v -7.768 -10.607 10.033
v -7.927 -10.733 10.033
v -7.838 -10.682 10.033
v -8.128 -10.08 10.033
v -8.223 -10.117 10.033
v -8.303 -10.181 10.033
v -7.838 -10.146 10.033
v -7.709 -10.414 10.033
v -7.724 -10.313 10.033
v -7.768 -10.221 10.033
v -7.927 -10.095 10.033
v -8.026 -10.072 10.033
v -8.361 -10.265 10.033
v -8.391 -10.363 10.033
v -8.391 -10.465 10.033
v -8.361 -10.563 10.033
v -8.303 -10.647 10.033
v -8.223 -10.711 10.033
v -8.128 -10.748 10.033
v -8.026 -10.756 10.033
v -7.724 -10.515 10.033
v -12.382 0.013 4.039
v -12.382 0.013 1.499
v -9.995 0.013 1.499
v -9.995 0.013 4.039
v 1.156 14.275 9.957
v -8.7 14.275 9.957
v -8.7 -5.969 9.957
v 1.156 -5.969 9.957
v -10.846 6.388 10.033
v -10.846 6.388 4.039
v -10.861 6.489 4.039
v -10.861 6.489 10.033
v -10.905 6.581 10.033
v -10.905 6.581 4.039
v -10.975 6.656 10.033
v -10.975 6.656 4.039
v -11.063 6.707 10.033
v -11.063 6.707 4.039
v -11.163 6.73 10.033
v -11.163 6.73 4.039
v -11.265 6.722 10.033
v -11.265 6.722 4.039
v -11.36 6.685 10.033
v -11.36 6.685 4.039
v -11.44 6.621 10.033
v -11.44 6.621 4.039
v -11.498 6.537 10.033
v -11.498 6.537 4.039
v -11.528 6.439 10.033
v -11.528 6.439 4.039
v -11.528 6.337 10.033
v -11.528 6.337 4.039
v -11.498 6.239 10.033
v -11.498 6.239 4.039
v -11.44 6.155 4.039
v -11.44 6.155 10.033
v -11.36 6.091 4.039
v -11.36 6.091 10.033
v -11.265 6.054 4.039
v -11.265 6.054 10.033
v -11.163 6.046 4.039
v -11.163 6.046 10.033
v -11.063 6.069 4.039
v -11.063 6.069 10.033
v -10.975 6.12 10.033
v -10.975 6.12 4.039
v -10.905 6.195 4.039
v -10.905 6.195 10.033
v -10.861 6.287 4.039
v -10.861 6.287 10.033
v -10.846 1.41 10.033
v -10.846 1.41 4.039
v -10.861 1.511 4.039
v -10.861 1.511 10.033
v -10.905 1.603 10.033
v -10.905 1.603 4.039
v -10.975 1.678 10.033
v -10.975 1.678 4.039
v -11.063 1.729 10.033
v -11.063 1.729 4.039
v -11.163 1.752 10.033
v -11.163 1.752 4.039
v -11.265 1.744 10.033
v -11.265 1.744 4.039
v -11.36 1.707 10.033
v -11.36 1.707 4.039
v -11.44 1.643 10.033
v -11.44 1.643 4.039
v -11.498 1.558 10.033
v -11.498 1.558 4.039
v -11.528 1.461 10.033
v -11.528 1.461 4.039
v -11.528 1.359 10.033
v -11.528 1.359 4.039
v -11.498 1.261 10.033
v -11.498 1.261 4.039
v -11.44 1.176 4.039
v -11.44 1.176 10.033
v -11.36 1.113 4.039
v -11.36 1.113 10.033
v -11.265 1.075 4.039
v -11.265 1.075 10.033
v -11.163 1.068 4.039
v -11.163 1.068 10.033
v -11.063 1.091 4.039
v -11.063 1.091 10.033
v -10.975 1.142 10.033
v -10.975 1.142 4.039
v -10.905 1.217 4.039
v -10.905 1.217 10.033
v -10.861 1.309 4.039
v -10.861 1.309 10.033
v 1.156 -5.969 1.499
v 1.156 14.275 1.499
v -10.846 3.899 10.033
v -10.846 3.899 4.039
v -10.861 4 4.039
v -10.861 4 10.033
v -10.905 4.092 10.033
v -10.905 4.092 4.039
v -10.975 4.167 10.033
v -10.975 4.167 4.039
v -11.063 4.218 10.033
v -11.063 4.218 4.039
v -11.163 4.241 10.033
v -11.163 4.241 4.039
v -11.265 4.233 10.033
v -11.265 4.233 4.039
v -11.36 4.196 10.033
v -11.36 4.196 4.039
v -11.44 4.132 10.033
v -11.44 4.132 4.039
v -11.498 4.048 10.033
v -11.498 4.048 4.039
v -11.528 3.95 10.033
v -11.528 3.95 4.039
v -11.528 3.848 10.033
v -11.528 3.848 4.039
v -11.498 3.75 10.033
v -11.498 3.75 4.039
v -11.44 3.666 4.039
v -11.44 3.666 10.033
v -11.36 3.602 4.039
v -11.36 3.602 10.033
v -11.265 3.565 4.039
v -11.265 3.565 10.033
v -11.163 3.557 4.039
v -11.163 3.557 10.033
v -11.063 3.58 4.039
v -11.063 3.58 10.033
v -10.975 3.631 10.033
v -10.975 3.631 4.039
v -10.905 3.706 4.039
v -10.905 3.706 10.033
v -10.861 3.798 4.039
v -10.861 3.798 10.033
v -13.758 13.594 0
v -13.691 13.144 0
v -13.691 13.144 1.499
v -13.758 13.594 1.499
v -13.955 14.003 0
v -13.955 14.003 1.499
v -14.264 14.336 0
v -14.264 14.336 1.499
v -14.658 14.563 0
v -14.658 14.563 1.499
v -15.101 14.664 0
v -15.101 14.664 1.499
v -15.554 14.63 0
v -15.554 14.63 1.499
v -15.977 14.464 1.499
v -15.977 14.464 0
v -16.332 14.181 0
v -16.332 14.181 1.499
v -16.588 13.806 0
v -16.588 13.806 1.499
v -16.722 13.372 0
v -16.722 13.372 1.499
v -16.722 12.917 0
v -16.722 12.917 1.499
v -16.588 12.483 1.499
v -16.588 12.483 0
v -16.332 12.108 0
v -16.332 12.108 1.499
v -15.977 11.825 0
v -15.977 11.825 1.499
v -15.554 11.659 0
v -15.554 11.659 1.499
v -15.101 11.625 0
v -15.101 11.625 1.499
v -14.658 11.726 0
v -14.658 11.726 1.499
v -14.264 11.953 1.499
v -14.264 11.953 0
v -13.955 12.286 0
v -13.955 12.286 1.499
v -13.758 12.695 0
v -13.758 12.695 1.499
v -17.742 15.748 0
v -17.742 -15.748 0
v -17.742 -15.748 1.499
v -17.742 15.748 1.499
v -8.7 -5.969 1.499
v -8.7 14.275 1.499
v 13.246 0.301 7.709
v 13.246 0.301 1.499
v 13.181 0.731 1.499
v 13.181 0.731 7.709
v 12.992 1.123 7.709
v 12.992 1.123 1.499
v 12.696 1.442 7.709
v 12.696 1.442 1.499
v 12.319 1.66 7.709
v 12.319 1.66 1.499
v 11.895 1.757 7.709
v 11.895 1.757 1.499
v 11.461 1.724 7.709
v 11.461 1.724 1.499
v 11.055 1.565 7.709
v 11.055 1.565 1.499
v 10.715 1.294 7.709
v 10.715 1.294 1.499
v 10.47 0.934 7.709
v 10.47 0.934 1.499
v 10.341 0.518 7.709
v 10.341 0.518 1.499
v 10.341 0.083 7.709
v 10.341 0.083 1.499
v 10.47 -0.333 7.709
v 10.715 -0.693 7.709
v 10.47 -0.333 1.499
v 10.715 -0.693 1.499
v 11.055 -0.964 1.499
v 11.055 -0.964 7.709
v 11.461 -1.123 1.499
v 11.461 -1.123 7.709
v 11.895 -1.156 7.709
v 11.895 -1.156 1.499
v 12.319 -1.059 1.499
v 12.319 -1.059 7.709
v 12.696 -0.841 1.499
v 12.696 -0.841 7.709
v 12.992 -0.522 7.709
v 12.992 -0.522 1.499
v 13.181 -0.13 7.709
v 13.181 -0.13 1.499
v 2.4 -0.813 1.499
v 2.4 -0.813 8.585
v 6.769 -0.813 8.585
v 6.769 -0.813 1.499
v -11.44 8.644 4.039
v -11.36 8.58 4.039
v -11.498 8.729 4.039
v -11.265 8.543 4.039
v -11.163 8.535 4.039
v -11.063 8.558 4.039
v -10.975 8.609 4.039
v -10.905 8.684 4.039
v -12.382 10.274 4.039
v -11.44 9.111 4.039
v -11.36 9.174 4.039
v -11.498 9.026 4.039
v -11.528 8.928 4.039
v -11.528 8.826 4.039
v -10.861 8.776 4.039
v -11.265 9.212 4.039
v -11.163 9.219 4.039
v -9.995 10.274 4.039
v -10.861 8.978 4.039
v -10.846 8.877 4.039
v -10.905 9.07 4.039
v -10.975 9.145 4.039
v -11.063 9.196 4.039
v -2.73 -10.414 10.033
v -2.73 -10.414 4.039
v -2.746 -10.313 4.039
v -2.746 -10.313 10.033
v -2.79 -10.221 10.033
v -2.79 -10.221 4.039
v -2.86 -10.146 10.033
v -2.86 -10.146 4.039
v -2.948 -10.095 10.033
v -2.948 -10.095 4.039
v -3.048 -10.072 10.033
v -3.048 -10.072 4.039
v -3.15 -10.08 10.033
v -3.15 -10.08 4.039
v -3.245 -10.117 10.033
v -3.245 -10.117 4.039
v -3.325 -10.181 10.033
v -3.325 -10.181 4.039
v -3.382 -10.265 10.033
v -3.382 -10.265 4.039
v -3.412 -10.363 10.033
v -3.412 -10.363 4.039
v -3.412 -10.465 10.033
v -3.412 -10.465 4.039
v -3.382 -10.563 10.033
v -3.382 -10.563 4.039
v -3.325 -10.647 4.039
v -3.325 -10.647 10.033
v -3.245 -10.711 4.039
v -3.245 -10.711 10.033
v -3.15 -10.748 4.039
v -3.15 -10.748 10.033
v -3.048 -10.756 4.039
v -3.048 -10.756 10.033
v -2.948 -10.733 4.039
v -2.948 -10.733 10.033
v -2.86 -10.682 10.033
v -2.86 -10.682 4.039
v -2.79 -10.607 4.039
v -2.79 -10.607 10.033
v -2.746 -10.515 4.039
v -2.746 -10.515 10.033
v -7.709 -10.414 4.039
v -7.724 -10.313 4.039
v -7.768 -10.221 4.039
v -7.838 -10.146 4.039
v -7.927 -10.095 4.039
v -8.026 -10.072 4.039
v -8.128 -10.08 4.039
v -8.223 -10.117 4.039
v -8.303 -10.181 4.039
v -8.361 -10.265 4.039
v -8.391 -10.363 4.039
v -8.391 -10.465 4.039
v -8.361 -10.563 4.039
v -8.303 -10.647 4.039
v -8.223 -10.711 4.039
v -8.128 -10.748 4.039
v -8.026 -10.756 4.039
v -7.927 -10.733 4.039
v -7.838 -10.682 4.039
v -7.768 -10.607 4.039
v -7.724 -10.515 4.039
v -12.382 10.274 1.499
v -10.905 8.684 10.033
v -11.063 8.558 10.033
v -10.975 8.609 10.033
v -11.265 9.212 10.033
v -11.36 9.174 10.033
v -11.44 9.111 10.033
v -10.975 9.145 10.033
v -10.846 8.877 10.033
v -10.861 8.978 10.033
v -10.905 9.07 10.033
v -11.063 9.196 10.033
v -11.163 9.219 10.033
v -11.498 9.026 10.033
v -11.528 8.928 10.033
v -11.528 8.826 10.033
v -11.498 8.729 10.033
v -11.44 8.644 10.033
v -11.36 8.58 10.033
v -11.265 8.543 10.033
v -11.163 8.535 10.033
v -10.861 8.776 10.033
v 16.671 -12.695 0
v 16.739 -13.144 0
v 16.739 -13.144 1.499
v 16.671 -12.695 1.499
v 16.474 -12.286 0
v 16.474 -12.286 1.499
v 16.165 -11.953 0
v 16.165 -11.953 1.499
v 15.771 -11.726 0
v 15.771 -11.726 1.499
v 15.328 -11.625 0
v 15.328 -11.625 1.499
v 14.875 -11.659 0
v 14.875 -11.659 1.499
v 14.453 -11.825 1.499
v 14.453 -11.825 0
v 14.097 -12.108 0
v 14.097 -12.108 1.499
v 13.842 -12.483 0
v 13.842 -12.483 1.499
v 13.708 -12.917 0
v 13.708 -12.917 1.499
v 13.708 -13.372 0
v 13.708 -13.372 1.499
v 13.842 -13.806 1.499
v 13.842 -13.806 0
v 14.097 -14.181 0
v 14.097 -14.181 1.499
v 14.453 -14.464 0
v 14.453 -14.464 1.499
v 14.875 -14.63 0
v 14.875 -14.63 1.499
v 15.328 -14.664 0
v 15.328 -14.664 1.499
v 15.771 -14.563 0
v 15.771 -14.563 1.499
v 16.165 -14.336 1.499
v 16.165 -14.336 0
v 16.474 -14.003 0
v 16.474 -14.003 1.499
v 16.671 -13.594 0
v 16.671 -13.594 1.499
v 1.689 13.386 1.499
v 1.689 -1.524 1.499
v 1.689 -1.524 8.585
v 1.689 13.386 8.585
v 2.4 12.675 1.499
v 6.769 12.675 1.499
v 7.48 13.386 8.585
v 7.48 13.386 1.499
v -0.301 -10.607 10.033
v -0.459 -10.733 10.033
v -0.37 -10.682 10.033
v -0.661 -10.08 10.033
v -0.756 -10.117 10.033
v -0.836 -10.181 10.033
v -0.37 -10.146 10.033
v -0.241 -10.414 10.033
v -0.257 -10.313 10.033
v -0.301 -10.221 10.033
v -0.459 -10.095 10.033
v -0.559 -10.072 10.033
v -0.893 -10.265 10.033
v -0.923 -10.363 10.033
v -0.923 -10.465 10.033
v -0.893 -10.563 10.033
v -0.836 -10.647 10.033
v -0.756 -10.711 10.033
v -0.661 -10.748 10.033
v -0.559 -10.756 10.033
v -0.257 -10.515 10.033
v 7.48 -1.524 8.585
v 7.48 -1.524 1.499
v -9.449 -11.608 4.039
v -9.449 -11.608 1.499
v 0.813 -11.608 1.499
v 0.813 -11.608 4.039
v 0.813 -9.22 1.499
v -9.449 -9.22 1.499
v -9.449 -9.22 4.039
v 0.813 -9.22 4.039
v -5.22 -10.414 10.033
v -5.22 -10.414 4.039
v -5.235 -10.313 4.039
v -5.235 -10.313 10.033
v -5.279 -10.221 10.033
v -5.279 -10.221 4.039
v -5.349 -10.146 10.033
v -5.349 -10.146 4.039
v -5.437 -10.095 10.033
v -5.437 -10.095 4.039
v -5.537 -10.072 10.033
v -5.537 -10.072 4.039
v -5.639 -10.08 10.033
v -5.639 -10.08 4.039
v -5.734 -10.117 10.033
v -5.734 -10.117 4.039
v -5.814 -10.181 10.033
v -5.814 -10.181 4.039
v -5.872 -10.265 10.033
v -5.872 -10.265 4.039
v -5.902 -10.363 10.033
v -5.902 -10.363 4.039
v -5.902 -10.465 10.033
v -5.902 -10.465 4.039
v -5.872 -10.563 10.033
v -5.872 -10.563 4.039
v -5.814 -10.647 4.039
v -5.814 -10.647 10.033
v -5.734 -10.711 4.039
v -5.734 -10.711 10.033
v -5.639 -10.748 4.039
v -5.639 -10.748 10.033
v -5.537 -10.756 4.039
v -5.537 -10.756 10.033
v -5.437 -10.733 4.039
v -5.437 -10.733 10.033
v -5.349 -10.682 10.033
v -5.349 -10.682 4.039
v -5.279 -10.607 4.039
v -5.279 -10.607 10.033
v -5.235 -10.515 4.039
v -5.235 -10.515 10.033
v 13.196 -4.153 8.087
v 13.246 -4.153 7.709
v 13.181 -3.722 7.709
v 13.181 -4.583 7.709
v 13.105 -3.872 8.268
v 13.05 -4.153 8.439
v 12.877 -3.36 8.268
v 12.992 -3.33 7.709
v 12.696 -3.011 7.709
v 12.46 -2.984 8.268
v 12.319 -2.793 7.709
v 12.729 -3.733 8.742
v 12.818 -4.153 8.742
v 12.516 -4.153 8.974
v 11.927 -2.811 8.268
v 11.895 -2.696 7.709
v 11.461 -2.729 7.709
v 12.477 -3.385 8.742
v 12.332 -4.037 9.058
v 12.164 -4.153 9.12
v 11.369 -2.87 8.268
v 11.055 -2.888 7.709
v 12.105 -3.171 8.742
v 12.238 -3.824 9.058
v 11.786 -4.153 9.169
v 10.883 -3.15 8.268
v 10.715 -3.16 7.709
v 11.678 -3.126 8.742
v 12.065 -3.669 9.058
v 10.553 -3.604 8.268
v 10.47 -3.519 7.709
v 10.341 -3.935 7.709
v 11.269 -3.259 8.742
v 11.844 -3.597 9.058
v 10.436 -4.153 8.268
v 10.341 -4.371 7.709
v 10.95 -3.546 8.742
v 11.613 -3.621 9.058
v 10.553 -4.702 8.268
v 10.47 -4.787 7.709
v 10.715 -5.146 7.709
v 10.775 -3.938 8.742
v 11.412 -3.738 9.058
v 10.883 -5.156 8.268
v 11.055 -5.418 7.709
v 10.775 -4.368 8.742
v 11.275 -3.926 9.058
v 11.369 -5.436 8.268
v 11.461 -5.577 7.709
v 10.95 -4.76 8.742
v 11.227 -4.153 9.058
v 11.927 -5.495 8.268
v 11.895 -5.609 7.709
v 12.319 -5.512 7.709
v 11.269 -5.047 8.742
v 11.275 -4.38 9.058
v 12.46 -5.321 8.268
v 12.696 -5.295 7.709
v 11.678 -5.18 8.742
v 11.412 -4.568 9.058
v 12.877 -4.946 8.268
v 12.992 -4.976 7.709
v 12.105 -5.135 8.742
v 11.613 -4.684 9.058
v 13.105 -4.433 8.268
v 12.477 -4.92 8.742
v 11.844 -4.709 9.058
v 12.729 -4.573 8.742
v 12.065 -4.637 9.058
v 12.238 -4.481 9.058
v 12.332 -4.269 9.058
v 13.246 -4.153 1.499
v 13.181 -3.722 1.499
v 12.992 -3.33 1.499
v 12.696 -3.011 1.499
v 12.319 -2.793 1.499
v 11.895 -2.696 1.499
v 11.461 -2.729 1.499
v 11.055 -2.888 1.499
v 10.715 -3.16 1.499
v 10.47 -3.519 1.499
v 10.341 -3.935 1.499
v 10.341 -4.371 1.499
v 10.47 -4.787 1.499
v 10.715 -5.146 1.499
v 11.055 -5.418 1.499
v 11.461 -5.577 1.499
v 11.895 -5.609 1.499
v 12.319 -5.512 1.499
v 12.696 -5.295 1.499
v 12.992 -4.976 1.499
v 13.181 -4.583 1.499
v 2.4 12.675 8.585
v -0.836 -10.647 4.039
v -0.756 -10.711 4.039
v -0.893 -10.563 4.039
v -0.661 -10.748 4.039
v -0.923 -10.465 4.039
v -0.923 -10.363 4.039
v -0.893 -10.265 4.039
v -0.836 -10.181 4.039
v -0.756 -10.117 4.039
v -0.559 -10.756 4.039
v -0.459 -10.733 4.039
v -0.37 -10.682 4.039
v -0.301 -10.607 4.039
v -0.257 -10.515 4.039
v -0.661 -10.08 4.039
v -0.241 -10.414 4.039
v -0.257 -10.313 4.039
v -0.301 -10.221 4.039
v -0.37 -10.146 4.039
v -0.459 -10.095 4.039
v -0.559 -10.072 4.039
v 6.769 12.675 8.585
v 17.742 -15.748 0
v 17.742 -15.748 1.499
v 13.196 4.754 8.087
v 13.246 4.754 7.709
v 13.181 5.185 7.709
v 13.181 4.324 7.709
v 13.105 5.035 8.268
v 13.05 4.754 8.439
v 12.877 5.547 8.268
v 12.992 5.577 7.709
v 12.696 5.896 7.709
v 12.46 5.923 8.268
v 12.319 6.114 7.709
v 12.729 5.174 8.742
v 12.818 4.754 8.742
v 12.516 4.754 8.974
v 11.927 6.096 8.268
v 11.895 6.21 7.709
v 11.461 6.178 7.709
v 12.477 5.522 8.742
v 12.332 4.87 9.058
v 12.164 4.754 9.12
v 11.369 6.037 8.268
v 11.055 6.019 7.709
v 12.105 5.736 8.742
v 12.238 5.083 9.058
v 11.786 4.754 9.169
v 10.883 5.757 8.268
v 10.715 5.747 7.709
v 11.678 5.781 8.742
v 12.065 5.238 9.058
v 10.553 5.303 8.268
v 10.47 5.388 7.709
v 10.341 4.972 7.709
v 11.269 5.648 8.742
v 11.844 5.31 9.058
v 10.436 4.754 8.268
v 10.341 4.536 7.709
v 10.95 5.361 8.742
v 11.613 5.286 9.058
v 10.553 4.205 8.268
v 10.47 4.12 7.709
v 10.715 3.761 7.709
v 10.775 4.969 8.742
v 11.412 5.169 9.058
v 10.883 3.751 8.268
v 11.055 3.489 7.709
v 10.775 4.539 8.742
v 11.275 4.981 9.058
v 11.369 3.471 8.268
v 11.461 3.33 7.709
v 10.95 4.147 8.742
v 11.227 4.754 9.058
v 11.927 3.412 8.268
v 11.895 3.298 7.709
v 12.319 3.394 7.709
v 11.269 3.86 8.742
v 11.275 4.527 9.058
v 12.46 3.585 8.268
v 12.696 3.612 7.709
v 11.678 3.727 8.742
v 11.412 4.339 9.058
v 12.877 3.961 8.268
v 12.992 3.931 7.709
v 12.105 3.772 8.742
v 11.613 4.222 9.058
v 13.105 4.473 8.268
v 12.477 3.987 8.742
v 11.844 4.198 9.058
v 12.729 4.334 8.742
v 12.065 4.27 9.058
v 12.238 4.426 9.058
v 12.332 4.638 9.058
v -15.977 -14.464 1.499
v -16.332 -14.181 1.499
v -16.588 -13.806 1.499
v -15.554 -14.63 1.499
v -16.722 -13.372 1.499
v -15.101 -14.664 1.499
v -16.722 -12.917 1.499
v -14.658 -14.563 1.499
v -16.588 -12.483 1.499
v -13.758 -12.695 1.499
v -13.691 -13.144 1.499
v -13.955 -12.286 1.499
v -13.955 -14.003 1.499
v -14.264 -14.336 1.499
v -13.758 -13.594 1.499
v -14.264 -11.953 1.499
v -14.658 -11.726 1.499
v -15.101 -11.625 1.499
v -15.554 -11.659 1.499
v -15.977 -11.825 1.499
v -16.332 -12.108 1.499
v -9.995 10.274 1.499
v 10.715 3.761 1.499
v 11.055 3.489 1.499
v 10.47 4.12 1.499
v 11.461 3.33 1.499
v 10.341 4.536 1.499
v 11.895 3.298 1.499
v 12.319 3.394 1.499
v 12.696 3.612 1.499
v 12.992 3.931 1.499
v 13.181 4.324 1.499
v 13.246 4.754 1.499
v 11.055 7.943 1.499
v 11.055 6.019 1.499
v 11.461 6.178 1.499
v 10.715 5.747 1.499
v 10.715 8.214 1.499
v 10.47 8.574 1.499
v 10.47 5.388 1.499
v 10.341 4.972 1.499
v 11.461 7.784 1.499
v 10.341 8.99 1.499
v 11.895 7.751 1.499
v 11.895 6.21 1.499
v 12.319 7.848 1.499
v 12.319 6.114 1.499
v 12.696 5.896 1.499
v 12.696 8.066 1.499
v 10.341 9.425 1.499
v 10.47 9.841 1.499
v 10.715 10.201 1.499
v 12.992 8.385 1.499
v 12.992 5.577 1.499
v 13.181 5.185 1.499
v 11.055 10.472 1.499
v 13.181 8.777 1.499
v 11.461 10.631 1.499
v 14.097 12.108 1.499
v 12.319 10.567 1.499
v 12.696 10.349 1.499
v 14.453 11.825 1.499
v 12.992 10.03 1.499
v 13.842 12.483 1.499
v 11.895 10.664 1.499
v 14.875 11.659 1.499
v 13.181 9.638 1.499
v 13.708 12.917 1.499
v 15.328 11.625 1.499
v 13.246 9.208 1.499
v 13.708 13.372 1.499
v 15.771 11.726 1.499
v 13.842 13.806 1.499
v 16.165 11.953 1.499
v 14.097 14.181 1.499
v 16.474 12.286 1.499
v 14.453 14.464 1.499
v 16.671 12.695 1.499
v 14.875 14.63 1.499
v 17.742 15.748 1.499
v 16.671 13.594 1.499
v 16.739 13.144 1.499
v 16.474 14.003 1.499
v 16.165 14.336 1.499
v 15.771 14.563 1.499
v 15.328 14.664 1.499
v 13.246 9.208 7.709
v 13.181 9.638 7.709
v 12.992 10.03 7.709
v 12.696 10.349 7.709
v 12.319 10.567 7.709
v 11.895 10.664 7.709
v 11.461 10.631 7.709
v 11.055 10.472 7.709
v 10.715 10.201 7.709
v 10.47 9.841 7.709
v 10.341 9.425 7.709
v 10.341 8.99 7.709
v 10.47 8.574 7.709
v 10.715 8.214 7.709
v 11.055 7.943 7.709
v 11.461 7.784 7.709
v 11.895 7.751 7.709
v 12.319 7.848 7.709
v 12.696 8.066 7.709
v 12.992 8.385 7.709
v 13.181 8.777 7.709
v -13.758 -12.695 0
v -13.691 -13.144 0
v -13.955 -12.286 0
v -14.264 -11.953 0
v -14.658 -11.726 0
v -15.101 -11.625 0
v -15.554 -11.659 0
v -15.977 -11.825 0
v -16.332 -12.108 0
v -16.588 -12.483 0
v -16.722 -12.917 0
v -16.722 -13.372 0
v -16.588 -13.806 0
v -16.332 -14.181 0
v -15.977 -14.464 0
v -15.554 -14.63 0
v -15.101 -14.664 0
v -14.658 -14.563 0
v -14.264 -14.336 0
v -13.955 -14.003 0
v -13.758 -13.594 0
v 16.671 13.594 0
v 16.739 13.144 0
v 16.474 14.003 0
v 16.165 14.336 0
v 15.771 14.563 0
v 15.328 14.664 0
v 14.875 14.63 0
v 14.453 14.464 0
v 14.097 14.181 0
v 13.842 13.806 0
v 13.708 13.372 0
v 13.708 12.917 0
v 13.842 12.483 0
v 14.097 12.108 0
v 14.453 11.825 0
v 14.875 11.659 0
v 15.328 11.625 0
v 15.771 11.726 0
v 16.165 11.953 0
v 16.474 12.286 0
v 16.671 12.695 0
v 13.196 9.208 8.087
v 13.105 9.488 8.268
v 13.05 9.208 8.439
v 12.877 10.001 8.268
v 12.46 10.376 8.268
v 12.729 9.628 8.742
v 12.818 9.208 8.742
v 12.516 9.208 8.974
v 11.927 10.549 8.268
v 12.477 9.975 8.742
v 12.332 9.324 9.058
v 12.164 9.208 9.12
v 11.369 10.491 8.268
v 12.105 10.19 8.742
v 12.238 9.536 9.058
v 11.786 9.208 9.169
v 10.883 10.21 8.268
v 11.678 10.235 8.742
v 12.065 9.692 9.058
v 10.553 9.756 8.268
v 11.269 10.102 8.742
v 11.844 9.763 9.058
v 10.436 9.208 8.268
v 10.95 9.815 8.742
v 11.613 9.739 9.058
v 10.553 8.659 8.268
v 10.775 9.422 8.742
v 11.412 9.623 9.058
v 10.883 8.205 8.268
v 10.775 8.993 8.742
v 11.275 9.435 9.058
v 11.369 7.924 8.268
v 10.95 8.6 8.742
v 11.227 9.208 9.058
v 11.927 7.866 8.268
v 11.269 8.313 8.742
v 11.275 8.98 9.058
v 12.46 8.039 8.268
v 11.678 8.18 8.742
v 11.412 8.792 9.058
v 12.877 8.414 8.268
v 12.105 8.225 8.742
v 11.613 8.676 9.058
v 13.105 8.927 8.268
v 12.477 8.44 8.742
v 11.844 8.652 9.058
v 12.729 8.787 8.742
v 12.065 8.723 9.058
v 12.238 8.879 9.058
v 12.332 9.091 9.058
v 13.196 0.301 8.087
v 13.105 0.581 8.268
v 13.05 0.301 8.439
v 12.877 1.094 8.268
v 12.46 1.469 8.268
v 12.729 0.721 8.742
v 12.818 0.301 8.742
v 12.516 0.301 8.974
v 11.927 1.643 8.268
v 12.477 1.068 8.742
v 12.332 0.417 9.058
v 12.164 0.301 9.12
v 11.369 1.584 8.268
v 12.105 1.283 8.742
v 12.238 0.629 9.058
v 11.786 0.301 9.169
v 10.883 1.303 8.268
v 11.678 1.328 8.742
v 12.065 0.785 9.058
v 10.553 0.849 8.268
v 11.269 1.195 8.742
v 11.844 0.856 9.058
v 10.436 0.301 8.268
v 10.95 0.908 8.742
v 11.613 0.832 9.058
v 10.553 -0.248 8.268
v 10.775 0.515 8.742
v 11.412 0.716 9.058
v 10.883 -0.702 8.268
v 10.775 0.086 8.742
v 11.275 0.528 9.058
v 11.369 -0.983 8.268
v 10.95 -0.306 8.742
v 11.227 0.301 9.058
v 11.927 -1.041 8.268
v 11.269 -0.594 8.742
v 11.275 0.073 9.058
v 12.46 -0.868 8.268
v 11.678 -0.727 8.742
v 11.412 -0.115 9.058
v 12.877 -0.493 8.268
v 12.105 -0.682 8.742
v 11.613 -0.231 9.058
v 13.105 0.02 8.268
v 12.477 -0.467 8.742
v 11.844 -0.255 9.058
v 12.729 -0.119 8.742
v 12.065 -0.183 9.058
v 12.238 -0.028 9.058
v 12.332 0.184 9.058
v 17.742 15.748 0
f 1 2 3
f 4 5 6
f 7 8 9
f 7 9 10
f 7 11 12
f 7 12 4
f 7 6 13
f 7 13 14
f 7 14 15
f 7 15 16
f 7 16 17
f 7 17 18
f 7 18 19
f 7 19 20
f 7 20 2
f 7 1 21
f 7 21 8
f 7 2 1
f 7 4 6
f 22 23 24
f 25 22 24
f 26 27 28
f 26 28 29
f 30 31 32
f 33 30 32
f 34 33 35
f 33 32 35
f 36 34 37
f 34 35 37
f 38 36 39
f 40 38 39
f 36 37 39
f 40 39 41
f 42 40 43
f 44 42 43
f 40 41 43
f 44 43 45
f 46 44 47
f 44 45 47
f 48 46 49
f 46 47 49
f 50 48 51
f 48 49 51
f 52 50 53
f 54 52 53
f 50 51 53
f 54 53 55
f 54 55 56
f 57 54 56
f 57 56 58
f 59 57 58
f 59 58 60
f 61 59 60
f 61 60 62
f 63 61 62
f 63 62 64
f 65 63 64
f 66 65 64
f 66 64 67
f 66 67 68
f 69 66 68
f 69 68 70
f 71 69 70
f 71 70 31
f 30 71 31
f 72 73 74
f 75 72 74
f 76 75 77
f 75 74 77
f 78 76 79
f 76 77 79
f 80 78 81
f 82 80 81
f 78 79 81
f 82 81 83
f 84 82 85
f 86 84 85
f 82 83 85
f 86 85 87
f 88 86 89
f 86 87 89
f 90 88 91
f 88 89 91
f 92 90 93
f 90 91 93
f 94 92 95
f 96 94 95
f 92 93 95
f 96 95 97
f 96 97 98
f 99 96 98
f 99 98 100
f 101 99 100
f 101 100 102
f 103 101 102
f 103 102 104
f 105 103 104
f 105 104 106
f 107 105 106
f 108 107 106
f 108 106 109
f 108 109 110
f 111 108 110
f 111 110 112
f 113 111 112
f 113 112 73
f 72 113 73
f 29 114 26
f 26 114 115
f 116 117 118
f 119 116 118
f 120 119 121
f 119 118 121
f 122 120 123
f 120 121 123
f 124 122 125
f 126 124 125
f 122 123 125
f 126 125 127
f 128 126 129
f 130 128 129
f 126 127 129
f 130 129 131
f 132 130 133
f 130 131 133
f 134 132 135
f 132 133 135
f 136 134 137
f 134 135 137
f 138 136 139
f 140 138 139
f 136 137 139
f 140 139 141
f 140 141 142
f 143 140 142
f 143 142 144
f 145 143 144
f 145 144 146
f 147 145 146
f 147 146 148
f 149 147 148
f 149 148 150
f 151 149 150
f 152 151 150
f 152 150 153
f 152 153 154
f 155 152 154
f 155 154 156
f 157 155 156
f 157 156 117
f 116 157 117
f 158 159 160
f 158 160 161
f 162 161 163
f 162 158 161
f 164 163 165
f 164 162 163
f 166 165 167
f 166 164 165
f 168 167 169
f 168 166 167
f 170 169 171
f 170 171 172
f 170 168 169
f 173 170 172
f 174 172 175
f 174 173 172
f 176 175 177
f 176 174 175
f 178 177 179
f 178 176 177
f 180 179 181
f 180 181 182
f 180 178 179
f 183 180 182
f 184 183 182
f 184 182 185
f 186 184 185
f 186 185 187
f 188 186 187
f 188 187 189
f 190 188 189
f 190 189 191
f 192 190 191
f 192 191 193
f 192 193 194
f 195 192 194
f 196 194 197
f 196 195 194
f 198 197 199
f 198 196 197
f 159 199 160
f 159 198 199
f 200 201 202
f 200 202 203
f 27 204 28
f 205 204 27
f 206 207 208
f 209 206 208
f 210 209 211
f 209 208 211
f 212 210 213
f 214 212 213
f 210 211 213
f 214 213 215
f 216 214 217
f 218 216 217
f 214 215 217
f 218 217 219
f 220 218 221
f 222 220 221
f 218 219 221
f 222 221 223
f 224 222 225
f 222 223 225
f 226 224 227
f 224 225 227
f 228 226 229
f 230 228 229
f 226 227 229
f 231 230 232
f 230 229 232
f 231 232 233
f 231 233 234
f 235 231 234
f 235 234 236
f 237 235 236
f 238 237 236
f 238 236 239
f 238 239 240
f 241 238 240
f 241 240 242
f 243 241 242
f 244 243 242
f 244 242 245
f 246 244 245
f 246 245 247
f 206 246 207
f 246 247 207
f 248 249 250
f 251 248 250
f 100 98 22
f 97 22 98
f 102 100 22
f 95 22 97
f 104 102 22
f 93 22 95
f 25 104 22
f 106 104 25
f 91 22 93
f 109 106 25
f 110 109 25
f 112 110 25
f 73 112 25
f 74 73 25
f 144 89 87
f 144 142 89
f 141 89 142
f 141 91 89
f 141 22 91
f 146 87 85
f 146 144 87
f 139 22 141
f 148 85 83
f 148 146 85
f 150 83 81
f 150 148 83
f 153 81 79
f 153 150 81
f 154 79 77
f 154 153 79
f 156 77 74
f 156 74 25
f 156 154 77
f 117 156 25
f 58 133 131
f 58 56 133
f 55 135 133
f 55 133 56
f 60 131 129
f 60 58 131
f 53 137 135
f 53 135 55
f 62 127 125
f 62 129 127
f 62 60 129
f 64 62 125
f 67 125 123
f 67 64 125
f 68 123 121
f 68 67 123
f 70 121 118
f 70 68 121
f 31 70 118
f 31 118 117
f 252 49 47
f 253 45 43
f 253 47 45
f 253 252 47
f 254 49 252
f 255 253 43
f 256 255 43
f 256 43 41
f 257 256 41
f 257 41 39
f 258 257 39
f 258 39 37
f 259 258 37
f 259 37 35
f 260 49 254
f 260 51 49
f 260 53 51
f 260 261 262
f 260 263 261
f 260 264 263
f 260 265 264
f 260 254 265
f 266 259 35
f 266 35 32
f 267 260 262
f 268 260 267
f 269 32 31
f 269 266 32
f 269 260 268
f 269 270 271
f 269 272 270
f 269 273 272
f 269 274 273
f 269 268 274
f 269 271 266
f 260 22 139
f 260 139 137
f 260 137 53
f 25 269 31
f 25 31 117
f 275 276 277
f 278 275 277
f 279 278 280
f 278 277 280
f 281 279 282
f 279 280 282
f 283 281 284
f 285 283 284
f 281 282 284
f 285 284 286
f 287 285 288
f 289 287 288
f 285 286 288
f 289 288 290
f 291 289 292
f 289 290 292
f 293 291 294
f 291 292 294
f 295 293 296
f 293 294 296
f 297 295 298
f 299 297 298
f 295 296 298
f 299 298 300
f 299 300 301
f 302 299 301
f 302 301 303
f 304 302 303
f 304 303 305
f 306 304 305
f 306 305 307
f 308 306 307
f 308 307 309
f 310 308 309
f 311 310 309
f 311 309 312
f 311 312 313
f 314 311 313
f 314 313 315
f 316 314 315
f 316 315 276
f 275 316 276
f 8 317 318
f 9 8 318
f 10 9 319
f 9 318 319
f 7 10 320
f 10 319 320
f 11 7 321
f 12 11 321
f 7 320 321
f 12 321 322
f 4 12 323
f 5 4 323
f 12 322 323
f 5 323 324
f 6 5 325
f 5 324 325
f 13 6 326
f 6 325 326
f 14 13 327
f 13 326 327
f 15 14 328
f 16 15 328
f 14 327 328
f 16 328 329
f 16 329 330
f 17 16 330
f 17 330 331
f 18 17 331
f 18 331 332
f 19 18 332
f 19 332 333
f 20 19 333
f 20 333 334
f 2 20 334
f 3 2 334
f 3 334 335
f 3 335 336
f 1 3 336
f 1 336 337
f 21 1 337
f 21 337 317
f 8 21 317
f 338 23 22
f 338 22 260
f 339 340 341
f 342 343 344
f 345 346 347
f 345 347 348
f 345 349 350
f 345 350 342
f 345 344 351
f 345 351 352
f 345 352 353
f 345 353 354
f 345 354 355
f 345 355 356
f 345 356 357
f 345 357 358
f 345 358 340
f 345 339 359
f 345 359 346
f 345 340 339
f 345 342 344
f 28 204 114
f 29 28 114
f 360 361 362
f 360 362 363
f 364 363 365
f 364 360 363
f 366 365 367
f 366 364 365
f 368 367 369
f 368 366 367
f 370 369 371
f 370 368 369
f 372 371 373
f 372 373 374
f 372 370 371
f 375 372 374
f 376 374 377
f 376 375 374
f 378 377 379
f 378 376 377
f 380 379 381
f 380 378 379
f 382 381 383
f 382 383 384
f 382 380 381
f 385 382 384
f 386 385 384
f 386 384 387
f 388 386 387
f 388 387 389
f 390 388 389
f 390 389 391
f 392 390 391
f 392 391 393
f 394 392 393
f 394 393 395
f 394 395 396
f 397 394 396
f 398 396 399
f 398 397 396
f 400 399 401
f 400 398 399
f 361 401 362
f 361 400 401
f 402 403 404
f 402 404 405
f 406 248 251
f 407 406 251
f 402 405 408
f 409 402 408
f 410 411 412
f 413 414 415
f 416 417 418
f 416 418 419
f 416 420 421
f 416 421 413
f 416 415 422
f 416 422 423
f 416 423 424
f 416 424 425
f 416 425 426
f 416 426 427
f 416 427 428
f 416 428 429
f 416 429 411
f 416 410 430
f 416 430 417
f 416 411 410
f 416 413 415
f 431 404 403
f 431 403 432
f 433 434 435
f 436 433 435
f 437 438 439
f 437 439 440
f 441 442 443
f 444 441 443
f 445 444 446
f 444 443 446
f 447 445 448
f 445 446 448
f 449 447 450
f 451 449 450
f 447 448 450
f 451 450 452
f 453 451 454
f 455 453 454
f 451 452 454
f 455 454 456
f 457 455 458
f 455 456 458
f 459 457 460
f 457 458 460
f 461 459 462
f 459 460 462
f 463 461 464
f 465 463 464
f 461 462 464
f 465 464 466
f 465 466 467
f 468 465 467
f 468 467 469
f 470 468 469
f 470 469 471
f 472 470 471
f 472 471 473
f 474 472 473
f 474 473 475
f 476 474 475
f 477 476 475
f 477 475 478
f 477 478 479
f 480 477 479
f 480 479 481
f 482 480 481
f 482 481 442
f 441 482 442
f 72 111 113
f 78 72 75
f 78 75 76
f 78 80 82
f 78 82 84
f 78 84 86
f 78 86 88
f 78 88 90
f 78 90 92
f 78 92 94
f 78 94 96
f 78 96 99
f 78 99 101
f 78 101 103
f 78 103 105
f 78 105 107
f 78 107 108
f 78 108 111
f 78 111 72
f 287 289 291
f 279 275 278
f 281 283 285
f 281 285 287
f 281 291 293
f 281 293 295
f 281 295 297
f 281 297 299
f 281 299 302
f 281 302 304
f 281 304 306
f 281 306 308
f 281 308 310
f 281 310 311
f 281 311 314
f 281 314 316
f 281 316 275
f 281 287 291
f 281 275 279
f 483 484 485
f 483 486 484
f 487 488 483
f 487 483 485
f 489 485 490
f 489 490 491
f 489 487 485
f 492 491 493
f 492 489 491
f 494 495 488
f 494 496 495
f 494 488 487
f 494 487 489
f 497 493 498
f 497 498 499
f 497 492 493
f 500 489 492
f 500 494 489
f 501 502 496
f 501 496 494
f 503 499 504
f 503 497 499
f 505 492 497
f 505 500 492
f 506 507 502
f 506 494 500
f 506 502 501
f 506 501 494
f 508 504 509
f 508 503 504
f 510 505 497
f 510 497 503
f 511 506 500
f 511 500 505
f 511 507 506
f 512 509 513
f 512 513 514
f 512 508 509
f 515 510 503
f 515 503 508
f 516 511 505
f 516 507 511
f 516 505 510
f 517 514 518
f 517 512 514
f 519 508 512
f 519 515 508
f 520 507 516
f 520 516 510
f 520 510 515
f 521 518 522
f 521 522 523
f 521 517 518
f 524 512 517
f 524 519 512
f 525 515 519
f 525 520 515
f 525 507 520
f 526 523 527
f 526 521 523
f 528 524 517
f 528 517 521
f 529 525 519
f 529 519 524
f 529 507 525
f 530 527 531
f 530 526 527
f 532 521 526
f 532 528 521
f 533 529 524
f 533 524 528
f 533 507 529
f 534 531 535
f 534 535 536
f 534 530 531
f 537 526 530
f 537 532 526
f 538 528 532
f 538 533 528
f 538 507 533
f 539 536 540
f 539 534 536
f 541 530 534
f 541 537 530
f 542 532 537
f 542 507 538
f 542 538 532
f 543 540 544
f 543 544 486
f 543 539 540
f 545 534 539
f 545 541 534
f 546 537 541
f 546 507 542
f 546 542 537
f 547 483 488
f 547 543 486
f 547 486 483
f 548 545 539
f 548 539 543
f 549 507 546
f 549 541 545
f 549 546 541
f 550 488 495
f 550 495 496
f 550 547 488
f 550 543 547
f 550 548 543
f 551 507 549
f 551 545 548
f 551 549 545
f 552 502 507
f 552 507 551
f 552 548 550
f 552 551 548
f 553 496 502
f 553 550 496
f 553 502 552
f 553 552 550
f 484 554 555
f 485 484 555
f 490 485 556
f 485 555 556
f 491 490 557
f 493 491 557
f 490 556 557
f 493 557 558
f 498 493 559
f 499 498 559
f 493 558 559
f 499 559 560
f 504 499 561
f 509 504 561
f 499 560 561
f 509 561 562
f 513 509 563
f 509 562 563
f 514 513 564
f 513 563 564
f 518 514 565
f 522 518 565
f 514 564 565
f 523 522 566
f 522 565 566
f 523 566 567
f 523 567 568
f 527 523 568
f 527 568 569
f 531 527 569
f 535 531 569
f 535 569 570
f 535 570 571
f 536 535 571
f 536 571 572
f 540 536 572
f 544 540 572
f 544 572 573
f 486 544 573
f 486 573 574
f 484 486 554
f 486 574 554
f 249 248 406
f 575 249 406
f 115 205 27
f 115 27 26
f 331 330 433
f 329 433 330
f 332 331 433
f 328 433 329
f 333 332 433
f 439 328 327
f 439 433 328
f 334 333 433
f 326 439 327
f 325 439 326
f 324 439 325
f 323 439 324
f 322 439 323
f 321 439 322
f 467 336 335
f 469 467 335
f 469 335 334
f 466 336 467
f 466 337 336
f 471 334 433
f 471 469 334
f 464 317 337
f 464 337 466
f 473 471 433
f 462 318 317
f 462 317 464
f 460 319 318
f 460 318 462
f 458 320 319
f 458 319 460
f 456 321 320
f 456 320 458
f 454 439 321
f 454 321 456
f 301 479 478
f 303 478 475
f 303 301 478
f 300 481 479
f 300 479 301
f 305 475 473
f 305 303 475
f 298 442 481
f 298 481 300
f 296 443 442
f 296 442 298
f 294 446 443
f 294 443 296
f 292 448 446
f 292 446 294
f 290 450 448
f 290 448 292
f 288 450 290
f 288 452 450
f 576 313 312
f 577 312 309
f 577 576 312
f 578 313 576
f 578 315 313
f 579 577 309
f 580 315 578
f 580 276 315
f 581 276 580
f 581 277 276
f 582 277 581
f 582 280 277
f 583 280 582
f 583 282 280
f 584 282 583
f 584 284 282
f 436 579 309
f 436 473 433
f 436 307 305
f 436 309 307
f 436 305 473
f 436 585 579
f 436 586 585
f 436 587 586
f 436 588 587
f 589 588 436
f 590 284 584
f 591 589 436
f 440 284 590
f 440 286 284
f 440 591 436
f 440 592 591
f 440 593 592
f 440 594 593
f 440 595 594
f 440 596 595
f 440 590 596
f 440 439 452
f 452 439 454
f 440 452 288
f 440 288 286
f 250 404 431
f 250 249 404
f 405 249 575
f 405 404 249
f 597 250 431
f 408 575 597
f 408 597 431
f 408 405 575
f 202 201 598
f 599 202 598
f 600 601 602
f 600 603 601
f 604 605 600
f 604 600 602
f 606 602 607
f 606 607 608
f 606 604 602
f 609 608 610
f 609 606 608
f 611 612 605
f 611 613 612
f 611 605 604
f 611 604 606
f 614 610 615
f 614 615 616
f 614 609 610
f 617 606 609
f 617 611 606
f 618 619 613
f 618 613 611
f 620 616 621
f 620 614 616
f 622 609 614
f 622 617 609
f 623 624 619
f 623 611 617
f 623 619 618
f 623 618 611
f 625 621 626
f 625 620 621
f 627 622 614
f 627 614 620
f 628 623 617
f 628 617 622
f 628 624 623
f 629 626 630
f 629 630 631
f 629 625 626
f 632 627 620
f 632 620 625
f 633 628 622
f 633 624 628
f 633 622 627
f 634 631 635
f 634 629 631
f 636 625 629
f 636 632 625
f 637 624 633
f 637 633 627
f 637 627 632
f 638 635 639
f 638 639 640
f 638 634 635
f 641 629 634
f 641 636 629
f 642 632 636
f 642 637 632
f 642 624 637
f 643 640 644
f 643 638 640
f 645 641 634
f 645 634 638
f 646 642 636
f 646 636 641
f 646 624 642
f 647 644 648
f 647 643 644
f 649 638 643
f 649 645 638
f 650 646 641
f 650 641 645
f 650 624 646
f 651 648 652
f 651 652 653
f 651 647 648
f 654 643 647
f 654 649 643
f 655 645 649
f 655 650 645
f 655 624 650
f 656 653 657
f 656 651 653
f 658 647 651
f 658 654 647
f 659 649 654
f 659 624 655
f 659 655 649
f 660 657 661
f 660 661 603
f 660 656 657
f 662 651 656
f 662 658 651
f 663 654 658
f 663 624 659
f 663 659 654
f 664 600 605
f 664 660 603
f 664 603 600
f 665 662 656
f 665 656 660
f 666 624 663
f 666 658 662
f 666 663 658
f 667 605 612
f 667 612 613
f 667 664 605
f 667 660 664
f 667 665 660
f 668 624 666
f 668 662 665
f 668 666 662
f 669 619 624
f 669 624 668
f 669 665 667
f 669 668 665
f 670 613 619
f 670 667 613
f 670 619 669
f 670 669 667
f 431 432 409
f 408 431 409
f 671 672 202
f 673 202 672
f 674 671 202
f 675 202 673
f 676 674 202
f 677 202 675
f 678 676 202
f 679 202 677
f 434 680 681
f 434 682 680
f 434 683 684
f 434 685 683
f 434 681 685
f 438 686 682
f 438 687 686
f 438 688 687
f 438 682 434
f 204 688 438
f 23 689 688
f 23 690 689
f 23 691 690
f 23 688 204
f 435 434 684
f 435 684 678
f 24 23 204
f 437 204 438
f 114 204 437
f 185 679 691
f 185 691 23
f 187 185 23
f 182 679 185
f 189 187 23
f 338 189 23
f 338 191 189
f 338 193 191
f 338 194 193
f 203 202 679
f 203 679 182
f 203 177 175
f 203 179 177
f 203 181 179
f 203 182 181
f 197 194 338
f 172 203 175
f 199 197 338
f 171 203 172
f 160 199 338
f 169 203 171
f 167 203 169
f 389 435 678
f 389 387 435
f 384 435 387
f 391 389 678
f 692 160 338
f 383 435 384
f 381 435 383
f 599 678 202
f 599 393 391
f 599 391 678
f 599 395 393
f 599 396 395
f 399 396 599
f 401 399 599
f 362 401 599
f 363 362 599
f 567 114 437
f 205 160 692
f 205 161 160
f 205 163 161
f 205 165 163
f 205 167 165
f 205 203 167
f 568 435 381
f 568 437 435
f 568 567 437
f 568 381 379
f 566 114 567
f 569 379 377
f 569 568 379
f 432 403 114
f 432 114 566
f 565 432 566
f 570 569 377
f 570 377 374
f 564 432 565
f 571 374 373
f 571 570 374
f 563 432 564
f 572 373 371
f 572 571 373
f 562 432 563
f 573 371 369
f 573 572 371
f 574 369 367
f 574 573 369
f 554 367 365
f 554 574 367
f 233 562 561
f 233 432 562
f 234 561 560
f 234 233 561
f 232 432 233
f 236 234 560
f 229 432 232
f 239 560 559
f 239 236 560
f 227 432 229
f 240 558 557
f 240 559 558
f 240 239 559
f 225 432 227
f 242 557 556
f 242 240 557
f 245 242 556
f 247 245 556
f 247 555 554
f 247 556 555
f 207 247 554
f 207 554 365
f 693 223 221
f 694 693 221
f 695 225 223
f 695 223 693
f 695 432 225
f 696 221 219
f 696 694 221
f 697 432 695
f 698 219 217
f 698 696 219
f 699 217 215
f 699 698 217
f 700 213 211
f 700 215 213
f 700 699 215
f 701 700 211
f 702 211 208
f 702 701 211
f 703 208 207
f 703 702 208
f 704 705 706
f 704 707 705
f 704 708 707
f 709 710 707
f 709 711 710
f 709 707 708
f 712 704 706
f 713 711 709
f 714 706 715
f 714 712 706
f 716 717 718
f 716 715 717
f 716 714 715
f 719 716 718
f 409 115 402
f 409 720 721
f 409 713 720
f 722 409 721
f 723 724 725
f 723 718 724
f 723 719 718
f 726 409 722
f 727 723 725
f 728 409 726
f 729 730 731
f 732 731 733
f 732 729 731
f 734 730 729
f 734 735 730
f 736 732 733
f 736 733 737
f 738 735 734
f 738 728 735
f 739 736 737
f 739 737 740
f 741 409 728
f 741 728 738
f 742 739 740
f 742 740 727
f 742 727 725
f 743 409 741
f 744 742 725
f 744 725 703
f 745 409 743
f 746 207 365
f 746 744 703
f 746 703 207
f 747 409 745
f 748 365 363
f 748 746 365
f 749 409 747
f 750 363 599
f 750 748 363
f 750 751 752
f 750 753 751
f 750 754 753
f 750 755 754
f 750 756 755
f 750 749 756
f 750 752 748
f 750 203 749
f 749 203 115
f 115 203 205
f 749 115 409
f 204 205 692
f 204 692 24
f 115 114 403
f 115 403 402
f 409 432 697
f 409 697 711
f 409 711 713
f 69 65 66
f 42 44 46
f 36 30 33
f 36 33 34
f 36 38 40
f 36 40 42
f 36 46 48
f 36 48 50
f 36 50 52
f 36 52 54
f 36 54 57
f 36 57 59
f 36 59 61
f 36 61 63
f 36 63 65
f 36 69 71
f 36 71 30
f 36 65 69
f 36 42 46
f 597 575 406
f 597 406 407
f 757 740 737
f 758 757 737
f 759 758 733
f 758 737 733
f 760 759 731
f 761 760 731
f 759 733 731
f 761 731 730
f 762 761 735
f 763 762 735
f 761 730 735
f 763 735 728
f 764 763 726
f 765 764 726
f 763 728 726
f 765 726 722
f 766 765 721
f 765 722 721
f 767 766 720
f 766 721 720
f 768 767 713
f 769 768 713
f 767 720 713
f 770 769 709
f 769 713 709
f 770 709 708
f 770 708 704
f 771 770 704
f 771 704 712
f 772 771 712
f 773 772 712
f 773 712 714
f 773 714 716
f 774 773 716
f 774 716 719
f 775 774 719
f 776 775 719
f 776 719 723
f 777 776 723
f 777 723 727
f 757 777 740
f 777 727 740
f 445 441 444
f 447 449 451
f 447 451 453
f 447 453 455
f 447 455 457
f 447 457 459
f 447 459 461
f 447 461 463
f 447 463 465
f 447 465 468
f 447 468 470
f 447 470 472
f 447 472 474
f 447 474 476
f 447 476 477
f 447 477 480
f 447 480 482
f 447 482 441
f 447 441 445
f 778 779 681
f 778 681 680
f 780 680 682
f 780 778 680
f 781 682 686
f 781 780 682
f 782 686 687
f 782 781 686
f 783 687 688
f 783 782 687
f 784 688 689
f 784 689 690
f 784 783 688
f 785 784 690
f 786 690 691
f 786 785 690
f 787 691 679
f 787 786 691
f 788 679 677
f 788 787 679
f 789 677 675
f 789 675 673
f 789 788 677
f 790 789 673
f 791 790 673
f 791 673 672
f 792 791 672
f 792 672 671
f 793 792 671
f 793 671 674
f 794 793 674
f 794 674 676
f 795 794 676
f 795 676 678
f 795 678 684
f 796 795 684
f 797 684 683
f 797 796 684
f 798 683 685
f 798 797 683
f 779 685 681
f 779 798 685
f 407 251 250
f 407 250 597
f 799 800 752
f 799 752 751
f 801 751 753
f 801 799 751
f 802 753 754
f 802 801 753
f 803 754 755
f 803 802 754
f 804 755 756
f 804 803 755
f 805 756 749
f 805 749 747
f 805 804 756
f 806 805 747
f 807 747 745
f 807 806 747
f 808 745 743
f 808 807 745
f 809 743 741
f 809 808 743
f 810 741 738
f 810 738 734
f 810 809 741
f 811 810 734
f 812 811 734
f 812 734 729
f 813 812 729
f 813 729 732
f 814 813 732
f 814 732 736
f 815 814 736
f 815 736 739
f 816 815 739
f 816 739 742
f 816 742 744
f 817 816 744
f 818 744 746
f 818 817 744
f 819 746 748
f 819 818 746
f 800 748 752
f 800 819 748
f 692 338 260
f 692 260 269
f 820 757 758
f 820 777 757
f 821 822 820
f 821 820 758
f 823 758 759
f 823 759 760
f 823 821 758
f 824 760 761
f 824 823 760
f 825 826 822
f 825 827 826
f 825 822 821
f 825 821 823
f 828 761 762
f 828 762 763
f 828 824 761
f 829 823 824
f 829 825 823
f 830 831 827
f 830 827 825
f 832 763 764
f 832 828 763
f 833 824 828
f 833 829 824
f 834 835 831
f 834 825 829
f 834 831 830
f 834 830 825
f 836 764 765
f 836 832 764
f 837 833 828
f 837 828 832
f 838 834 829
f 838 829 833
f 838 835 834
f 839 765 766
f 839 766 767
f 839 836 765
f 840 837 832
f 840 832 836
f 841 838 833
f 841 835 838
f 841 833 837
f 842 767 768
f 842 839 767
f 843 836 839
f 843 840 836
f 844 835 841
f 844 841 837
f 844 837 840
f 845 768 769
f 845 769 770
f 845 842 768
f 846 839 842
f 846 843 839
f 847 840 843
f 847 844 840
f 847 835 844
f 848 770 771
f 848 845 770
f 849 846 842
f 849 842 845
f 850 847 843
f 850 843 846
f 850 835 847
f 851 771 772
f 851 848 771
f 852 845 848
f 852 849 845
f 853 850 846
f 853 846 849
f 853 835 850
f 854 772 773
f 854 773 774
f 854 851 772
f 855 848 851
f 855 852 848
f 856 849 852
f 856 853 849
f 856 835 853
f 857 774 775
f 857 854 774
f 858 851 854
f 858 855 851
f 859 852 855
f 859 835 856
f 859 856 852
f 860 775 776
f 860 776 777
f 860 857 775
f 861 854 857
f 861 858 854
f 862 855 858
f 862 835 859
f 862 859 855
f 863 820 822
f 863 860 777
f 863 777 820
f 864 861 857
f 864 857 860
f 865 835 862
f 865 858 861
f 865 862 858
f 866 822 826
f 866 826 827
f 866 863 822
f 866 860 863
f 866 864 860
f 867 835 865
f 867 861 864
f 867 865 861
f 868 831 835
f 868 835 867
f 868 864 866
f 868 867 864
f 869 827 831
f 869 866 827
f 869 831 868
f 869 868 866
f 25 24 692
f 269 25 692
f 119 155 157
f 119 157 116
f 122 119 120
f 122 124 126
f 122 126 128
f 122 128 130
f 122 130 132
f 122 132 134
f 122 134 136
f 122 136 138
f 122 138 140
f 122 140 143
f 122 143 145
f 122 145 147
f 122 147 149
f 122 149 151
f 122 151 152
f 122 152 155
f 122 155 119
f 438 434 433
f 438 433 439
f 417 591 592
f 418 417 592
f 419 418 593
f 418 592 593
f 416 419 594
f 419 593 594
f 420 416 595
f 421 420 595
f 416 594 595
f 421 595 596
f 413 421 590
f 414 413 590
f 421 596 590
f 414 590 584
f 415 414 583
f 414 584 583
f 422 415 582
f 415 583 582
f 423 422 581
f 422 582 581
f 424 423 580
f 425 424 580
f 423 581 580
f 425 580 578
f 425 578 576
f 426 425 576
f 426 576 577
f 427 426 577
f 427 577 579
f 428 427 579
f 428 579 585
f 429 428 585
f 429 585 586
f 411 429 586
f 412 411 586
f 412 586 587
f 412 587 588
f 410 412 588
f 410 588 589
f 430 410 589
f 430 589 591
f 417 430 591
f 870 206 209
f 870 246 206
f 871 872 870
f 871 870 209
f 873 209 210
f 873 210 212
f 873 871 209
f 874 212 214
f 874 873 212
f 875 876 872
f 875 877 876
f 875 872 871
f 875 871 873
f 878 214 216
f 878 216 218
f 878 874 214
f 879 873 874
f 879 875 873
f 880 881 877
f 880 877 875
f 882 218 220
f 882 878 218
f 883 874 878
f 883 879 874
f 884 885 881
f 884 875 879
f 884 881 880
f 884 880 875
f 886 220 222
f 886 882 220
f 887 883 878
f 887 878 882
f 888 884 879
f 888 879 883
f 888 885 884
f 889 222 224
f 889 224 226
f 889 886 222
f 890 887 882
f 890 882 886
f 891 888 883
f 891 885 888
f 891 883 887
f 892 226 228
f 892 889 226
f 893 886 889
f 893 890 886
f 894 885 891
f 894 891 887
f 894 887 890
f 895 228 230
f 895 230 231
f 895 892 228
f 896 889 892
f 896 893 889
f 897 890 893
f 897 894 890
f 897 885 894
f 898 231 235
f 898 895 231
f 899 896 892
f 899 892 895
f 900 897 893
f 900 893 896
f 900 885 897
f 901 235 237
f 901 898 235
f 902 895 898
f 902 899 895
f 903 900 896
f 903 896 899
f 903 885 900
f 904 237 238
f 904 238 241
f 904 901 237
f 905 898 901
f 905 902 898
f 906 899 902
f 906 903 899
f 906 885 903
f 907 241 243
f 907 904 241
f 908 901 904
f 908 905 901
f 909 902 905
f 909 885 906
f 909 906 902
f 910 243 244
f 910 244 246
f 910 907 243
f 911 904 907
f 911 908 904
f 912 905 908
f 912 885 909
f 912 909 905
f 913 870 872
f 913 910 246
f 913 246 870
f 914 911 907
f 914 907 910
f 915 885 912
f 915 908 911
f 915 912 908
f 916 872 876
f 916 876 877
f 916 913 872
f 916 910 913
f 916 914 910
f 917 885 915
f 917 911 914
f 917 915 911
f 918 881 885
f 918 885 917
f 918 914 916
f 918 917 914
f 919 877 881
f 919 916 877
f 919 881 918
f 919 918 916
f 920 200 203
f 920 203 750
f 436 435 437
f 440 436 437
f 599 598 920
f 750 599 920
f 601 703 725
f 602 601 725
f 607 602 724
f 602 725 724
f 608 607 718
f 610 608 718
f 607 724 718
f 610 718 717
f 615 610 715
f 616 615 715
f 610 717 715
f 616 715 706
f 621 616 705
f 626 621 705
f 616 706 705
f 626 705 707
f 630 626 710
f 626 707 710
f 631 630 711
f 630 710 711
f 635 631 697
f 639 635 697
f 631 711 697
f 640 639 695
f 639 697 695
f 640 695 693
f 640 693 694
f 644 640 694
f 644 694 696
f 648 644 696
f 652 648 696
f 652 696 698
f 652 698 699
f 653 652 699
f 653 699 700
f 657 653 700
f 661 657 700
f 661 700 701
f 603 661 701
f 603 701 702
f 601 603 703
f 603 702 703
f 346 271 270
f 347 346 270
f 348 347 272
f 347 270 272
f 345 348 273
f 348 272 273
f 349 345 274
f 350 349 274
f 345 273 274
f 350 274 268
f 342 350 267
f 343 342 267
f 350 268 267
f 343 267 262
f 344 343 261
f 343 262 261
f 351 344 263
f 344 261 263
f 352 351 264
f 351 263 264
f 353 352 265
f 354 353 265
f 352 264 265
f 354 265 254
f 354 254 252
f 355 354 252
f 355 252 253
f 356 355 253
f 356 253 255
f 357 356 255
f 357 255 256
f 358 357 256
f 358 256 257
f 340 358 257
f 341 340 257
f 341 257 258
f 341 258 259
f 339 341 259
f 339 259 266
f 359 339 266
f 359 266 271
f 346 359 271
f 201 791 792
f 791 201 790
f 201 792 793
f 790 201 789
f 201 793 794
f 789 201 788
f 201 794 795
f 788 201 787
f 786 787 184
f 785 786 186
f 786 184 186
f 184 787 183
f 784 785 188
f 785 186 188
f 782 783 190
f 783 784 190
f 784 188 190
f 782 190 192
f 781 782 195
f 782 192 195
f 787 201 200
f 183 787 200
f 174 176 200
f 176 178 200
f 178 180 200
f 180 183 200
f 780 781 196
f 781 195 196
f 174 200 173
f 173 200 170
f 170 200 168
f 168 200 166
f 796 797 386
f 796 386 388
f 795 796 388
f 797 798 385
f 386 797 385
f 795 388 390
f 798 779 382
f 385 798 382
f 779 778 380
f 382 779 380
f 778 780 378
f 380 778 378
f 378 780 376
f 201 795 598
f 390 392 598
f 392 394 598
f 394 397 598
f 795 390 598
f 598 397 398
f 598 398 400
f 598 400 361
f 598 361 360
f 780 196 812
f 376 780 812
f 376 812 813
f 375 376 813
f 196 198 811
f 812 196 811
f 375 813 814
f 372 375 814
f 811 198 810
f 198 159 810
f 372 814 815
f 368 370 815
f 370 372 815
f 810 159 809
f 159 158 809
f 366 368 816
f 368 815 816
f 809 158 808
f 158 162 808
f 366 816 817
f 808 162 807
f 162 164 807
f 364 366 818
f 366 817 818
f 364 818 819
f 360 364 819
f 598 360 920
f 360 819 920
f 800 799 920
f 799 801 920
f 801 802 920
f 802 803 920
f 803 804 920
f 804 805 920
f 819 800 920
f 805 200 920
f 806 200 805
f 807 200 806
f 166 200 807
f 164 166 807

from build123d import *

# Parameters (mm, degrees)
F0_W      = 35.4838
F0_H      = 31.496
F0_R      = 1.524
F1_DEPTH  = 1.4986
F2_W      = 9.8552
F2_H      = 20.2438
F3_DEPTH  = 8.4582
F2_W_2    = 5.7912
F2_H_2    = 14.9098
F2_W_3    = 4.3688
F2_H_3    = 13.4874
F4_DEPTH  = 7.0866
F2_R      = 1.4605
F5_DEPTH  = 7.6708
F6_R      = 1.4605
F2_R_2    = 0.3429
F7_DEPTH  = 8.5344
F8_DEPTH  = 8.5344
F2_W_4    = 2.3876
F2_H_4    = 10.2616
F9_DEPTH  = 2.54
F2_W_5    = 10.2616
F2_H_5    = 2.3876
F10_DEPTH = 2.54


with BuildPart() as f1:
    # F0 (on Top) → F1 (new body)
    with BuildSketch(Plane.XY):
        Rectangle(F0_W, F0_H)
        with Locations((-15.2146, -13.1445)):
            Circle(F0_R, mode=Mode.SUBTRACT)
        with Locations((15.2146, -13.1445)):
            Circle(F0_R, mode=Mode.SUBTRACT)
        with Locations((-15.2146, 13.1445)):
            Circle(F0_R, mode=Mode.SUBTRACT)
        with Locations((15.2146, 13.1445)):
            Circle(F0_R, mode=Mode.SUBTRACT)
    extrude(amount=F1_DEPTH)

    # F2 (on face) → F3 (join)
    with BuildSketch(Plane.XY.offset(1.4986)):
        with Locations((-3.7719, 4.1529)):
            Rectangle(F2_W, F2_H)
    extrude(amount=F3_DEPTH)

    # F2 (on face) → F4 (join)
    with BuildSketch(Plane.XY.offset(1.4986)):
        with Locations((4.5847, 5.9309)):
            Rectangle(F2_W_2, F2_H_2)
        with Locations((4.5847, 5.9309)):
            Rectangle(F2_W_3, F2_H_3, mode=Mode.SUBTRACT)
    extrude(amount=F4_DEPTH)

    # F2 (on face) → F5 (join)
    with BuildSketch(Plane.XY.offset(1.4986)):
        with Locations((11.7856, -4.1529)):
            Circle(F2_R)
        with Locations((11.7856, 0.300567)):
            Circle(F2_R)
        with Locations((11.7856, 4.754033)):
            Circle(F2_R)
        with Locations((11.7856, 9.2075)):
            Circle(F2_R)
    extrude(amount=F5_DEPTH)

    # F6
    f6_edges = [f1.edges().sort_by_distance(p)[0] for p in [
        (10.3251, -4.1529, 9.1694),
        (10.3251, 0.300567, 9.1694),
        (10.3251, 4.754033, 9.1694),
        (10.3251, 9.2075, 9.1694),
    ]]
    fillet(f6_edges, radius=F6_R)

    # F2 (on face) → F7 (join)
    with BuildSketch(Plane.XY.offset(1.4986)):
        with Locations((-11.1887, 1.4097)):
            Circle(F2_R_2)
        with Locations((-11.1887, 3.8989)):
            Circle(F2_R_2)
        with Locations((-11.1887, 6.3881)):
            Circle(F2_R_2)
        with Locations((-11.1887, 8.8773)):
            Circle(F2_R_2)
    extrude(amount=F7_DEPTH)

    # F2 (on face) → F8 (join)
    with BuildSketch(Plane.XY.offset(1.4986)):
        with Locations((-8.0518, -10.414)):
            Circle(F2_R_2)
        with Locations((-5.5626, -10.414)):
            Circle(F2_R_2)
        with Locations((-3.0734, -10.414)):
            Circle(F2_R_2)
        with Locations((-0.5842, -10.414)):
            Circle(F2_R_2)
    extrude(amount=F8_DEPTH)

    # F2 (on face) → F9 (join)
    with BuildSketch(Plane.XY.offset(1.4986)):
        with Locations((-11.1887, 5.1435)):
            Rectangle(F2_W_4, F2_H_4)
        with Locations((-11.1887, 1.4097)):
            Circle(F2_R_2, mode=Mode.SUBTRACT)
        with Locations((-11.1887, 3.8989)):
            Circle(F2_R_2, mode=Mode.SUBTRACT)
        with Locations((-11.1887, 6.3881)):
            Circle(F2_R_2, mode=Mode.SUBTRACT)
        with Locations((-11.1887, 8.8773)):
            Circle(F2_R_2, mode=Mode.SUBTRACT)
    extrude(amount=F9_DEPTH)

    # F2 (on face) → F10 (join)
    with BuildSketch(Plane.XY.offset(1.4986)):
        with Locations((-4.318, -10.414)):
            Rectangle(F2_W_5, F2_H_5)
        with Locations((-8.0518, -10.414)):
            Circle(F2_R_2, mode=Mode.SUBTRACT)
        with Locations((-5.5626, -10.414)):
            Circle(F2_R_2, mode=Mode.SUBTRACT)
        with Locations((-3.0734, -10.414)):
            Circle(F2_R_2, mode=Mode.SUBTRACT)
        with Locations((-0.5842, -10.414)):
            Circle(F2_R_2, mode=Mode.SUBTRACT)
    extrude(amount=F10_DEPTH)


solid = f1.part
